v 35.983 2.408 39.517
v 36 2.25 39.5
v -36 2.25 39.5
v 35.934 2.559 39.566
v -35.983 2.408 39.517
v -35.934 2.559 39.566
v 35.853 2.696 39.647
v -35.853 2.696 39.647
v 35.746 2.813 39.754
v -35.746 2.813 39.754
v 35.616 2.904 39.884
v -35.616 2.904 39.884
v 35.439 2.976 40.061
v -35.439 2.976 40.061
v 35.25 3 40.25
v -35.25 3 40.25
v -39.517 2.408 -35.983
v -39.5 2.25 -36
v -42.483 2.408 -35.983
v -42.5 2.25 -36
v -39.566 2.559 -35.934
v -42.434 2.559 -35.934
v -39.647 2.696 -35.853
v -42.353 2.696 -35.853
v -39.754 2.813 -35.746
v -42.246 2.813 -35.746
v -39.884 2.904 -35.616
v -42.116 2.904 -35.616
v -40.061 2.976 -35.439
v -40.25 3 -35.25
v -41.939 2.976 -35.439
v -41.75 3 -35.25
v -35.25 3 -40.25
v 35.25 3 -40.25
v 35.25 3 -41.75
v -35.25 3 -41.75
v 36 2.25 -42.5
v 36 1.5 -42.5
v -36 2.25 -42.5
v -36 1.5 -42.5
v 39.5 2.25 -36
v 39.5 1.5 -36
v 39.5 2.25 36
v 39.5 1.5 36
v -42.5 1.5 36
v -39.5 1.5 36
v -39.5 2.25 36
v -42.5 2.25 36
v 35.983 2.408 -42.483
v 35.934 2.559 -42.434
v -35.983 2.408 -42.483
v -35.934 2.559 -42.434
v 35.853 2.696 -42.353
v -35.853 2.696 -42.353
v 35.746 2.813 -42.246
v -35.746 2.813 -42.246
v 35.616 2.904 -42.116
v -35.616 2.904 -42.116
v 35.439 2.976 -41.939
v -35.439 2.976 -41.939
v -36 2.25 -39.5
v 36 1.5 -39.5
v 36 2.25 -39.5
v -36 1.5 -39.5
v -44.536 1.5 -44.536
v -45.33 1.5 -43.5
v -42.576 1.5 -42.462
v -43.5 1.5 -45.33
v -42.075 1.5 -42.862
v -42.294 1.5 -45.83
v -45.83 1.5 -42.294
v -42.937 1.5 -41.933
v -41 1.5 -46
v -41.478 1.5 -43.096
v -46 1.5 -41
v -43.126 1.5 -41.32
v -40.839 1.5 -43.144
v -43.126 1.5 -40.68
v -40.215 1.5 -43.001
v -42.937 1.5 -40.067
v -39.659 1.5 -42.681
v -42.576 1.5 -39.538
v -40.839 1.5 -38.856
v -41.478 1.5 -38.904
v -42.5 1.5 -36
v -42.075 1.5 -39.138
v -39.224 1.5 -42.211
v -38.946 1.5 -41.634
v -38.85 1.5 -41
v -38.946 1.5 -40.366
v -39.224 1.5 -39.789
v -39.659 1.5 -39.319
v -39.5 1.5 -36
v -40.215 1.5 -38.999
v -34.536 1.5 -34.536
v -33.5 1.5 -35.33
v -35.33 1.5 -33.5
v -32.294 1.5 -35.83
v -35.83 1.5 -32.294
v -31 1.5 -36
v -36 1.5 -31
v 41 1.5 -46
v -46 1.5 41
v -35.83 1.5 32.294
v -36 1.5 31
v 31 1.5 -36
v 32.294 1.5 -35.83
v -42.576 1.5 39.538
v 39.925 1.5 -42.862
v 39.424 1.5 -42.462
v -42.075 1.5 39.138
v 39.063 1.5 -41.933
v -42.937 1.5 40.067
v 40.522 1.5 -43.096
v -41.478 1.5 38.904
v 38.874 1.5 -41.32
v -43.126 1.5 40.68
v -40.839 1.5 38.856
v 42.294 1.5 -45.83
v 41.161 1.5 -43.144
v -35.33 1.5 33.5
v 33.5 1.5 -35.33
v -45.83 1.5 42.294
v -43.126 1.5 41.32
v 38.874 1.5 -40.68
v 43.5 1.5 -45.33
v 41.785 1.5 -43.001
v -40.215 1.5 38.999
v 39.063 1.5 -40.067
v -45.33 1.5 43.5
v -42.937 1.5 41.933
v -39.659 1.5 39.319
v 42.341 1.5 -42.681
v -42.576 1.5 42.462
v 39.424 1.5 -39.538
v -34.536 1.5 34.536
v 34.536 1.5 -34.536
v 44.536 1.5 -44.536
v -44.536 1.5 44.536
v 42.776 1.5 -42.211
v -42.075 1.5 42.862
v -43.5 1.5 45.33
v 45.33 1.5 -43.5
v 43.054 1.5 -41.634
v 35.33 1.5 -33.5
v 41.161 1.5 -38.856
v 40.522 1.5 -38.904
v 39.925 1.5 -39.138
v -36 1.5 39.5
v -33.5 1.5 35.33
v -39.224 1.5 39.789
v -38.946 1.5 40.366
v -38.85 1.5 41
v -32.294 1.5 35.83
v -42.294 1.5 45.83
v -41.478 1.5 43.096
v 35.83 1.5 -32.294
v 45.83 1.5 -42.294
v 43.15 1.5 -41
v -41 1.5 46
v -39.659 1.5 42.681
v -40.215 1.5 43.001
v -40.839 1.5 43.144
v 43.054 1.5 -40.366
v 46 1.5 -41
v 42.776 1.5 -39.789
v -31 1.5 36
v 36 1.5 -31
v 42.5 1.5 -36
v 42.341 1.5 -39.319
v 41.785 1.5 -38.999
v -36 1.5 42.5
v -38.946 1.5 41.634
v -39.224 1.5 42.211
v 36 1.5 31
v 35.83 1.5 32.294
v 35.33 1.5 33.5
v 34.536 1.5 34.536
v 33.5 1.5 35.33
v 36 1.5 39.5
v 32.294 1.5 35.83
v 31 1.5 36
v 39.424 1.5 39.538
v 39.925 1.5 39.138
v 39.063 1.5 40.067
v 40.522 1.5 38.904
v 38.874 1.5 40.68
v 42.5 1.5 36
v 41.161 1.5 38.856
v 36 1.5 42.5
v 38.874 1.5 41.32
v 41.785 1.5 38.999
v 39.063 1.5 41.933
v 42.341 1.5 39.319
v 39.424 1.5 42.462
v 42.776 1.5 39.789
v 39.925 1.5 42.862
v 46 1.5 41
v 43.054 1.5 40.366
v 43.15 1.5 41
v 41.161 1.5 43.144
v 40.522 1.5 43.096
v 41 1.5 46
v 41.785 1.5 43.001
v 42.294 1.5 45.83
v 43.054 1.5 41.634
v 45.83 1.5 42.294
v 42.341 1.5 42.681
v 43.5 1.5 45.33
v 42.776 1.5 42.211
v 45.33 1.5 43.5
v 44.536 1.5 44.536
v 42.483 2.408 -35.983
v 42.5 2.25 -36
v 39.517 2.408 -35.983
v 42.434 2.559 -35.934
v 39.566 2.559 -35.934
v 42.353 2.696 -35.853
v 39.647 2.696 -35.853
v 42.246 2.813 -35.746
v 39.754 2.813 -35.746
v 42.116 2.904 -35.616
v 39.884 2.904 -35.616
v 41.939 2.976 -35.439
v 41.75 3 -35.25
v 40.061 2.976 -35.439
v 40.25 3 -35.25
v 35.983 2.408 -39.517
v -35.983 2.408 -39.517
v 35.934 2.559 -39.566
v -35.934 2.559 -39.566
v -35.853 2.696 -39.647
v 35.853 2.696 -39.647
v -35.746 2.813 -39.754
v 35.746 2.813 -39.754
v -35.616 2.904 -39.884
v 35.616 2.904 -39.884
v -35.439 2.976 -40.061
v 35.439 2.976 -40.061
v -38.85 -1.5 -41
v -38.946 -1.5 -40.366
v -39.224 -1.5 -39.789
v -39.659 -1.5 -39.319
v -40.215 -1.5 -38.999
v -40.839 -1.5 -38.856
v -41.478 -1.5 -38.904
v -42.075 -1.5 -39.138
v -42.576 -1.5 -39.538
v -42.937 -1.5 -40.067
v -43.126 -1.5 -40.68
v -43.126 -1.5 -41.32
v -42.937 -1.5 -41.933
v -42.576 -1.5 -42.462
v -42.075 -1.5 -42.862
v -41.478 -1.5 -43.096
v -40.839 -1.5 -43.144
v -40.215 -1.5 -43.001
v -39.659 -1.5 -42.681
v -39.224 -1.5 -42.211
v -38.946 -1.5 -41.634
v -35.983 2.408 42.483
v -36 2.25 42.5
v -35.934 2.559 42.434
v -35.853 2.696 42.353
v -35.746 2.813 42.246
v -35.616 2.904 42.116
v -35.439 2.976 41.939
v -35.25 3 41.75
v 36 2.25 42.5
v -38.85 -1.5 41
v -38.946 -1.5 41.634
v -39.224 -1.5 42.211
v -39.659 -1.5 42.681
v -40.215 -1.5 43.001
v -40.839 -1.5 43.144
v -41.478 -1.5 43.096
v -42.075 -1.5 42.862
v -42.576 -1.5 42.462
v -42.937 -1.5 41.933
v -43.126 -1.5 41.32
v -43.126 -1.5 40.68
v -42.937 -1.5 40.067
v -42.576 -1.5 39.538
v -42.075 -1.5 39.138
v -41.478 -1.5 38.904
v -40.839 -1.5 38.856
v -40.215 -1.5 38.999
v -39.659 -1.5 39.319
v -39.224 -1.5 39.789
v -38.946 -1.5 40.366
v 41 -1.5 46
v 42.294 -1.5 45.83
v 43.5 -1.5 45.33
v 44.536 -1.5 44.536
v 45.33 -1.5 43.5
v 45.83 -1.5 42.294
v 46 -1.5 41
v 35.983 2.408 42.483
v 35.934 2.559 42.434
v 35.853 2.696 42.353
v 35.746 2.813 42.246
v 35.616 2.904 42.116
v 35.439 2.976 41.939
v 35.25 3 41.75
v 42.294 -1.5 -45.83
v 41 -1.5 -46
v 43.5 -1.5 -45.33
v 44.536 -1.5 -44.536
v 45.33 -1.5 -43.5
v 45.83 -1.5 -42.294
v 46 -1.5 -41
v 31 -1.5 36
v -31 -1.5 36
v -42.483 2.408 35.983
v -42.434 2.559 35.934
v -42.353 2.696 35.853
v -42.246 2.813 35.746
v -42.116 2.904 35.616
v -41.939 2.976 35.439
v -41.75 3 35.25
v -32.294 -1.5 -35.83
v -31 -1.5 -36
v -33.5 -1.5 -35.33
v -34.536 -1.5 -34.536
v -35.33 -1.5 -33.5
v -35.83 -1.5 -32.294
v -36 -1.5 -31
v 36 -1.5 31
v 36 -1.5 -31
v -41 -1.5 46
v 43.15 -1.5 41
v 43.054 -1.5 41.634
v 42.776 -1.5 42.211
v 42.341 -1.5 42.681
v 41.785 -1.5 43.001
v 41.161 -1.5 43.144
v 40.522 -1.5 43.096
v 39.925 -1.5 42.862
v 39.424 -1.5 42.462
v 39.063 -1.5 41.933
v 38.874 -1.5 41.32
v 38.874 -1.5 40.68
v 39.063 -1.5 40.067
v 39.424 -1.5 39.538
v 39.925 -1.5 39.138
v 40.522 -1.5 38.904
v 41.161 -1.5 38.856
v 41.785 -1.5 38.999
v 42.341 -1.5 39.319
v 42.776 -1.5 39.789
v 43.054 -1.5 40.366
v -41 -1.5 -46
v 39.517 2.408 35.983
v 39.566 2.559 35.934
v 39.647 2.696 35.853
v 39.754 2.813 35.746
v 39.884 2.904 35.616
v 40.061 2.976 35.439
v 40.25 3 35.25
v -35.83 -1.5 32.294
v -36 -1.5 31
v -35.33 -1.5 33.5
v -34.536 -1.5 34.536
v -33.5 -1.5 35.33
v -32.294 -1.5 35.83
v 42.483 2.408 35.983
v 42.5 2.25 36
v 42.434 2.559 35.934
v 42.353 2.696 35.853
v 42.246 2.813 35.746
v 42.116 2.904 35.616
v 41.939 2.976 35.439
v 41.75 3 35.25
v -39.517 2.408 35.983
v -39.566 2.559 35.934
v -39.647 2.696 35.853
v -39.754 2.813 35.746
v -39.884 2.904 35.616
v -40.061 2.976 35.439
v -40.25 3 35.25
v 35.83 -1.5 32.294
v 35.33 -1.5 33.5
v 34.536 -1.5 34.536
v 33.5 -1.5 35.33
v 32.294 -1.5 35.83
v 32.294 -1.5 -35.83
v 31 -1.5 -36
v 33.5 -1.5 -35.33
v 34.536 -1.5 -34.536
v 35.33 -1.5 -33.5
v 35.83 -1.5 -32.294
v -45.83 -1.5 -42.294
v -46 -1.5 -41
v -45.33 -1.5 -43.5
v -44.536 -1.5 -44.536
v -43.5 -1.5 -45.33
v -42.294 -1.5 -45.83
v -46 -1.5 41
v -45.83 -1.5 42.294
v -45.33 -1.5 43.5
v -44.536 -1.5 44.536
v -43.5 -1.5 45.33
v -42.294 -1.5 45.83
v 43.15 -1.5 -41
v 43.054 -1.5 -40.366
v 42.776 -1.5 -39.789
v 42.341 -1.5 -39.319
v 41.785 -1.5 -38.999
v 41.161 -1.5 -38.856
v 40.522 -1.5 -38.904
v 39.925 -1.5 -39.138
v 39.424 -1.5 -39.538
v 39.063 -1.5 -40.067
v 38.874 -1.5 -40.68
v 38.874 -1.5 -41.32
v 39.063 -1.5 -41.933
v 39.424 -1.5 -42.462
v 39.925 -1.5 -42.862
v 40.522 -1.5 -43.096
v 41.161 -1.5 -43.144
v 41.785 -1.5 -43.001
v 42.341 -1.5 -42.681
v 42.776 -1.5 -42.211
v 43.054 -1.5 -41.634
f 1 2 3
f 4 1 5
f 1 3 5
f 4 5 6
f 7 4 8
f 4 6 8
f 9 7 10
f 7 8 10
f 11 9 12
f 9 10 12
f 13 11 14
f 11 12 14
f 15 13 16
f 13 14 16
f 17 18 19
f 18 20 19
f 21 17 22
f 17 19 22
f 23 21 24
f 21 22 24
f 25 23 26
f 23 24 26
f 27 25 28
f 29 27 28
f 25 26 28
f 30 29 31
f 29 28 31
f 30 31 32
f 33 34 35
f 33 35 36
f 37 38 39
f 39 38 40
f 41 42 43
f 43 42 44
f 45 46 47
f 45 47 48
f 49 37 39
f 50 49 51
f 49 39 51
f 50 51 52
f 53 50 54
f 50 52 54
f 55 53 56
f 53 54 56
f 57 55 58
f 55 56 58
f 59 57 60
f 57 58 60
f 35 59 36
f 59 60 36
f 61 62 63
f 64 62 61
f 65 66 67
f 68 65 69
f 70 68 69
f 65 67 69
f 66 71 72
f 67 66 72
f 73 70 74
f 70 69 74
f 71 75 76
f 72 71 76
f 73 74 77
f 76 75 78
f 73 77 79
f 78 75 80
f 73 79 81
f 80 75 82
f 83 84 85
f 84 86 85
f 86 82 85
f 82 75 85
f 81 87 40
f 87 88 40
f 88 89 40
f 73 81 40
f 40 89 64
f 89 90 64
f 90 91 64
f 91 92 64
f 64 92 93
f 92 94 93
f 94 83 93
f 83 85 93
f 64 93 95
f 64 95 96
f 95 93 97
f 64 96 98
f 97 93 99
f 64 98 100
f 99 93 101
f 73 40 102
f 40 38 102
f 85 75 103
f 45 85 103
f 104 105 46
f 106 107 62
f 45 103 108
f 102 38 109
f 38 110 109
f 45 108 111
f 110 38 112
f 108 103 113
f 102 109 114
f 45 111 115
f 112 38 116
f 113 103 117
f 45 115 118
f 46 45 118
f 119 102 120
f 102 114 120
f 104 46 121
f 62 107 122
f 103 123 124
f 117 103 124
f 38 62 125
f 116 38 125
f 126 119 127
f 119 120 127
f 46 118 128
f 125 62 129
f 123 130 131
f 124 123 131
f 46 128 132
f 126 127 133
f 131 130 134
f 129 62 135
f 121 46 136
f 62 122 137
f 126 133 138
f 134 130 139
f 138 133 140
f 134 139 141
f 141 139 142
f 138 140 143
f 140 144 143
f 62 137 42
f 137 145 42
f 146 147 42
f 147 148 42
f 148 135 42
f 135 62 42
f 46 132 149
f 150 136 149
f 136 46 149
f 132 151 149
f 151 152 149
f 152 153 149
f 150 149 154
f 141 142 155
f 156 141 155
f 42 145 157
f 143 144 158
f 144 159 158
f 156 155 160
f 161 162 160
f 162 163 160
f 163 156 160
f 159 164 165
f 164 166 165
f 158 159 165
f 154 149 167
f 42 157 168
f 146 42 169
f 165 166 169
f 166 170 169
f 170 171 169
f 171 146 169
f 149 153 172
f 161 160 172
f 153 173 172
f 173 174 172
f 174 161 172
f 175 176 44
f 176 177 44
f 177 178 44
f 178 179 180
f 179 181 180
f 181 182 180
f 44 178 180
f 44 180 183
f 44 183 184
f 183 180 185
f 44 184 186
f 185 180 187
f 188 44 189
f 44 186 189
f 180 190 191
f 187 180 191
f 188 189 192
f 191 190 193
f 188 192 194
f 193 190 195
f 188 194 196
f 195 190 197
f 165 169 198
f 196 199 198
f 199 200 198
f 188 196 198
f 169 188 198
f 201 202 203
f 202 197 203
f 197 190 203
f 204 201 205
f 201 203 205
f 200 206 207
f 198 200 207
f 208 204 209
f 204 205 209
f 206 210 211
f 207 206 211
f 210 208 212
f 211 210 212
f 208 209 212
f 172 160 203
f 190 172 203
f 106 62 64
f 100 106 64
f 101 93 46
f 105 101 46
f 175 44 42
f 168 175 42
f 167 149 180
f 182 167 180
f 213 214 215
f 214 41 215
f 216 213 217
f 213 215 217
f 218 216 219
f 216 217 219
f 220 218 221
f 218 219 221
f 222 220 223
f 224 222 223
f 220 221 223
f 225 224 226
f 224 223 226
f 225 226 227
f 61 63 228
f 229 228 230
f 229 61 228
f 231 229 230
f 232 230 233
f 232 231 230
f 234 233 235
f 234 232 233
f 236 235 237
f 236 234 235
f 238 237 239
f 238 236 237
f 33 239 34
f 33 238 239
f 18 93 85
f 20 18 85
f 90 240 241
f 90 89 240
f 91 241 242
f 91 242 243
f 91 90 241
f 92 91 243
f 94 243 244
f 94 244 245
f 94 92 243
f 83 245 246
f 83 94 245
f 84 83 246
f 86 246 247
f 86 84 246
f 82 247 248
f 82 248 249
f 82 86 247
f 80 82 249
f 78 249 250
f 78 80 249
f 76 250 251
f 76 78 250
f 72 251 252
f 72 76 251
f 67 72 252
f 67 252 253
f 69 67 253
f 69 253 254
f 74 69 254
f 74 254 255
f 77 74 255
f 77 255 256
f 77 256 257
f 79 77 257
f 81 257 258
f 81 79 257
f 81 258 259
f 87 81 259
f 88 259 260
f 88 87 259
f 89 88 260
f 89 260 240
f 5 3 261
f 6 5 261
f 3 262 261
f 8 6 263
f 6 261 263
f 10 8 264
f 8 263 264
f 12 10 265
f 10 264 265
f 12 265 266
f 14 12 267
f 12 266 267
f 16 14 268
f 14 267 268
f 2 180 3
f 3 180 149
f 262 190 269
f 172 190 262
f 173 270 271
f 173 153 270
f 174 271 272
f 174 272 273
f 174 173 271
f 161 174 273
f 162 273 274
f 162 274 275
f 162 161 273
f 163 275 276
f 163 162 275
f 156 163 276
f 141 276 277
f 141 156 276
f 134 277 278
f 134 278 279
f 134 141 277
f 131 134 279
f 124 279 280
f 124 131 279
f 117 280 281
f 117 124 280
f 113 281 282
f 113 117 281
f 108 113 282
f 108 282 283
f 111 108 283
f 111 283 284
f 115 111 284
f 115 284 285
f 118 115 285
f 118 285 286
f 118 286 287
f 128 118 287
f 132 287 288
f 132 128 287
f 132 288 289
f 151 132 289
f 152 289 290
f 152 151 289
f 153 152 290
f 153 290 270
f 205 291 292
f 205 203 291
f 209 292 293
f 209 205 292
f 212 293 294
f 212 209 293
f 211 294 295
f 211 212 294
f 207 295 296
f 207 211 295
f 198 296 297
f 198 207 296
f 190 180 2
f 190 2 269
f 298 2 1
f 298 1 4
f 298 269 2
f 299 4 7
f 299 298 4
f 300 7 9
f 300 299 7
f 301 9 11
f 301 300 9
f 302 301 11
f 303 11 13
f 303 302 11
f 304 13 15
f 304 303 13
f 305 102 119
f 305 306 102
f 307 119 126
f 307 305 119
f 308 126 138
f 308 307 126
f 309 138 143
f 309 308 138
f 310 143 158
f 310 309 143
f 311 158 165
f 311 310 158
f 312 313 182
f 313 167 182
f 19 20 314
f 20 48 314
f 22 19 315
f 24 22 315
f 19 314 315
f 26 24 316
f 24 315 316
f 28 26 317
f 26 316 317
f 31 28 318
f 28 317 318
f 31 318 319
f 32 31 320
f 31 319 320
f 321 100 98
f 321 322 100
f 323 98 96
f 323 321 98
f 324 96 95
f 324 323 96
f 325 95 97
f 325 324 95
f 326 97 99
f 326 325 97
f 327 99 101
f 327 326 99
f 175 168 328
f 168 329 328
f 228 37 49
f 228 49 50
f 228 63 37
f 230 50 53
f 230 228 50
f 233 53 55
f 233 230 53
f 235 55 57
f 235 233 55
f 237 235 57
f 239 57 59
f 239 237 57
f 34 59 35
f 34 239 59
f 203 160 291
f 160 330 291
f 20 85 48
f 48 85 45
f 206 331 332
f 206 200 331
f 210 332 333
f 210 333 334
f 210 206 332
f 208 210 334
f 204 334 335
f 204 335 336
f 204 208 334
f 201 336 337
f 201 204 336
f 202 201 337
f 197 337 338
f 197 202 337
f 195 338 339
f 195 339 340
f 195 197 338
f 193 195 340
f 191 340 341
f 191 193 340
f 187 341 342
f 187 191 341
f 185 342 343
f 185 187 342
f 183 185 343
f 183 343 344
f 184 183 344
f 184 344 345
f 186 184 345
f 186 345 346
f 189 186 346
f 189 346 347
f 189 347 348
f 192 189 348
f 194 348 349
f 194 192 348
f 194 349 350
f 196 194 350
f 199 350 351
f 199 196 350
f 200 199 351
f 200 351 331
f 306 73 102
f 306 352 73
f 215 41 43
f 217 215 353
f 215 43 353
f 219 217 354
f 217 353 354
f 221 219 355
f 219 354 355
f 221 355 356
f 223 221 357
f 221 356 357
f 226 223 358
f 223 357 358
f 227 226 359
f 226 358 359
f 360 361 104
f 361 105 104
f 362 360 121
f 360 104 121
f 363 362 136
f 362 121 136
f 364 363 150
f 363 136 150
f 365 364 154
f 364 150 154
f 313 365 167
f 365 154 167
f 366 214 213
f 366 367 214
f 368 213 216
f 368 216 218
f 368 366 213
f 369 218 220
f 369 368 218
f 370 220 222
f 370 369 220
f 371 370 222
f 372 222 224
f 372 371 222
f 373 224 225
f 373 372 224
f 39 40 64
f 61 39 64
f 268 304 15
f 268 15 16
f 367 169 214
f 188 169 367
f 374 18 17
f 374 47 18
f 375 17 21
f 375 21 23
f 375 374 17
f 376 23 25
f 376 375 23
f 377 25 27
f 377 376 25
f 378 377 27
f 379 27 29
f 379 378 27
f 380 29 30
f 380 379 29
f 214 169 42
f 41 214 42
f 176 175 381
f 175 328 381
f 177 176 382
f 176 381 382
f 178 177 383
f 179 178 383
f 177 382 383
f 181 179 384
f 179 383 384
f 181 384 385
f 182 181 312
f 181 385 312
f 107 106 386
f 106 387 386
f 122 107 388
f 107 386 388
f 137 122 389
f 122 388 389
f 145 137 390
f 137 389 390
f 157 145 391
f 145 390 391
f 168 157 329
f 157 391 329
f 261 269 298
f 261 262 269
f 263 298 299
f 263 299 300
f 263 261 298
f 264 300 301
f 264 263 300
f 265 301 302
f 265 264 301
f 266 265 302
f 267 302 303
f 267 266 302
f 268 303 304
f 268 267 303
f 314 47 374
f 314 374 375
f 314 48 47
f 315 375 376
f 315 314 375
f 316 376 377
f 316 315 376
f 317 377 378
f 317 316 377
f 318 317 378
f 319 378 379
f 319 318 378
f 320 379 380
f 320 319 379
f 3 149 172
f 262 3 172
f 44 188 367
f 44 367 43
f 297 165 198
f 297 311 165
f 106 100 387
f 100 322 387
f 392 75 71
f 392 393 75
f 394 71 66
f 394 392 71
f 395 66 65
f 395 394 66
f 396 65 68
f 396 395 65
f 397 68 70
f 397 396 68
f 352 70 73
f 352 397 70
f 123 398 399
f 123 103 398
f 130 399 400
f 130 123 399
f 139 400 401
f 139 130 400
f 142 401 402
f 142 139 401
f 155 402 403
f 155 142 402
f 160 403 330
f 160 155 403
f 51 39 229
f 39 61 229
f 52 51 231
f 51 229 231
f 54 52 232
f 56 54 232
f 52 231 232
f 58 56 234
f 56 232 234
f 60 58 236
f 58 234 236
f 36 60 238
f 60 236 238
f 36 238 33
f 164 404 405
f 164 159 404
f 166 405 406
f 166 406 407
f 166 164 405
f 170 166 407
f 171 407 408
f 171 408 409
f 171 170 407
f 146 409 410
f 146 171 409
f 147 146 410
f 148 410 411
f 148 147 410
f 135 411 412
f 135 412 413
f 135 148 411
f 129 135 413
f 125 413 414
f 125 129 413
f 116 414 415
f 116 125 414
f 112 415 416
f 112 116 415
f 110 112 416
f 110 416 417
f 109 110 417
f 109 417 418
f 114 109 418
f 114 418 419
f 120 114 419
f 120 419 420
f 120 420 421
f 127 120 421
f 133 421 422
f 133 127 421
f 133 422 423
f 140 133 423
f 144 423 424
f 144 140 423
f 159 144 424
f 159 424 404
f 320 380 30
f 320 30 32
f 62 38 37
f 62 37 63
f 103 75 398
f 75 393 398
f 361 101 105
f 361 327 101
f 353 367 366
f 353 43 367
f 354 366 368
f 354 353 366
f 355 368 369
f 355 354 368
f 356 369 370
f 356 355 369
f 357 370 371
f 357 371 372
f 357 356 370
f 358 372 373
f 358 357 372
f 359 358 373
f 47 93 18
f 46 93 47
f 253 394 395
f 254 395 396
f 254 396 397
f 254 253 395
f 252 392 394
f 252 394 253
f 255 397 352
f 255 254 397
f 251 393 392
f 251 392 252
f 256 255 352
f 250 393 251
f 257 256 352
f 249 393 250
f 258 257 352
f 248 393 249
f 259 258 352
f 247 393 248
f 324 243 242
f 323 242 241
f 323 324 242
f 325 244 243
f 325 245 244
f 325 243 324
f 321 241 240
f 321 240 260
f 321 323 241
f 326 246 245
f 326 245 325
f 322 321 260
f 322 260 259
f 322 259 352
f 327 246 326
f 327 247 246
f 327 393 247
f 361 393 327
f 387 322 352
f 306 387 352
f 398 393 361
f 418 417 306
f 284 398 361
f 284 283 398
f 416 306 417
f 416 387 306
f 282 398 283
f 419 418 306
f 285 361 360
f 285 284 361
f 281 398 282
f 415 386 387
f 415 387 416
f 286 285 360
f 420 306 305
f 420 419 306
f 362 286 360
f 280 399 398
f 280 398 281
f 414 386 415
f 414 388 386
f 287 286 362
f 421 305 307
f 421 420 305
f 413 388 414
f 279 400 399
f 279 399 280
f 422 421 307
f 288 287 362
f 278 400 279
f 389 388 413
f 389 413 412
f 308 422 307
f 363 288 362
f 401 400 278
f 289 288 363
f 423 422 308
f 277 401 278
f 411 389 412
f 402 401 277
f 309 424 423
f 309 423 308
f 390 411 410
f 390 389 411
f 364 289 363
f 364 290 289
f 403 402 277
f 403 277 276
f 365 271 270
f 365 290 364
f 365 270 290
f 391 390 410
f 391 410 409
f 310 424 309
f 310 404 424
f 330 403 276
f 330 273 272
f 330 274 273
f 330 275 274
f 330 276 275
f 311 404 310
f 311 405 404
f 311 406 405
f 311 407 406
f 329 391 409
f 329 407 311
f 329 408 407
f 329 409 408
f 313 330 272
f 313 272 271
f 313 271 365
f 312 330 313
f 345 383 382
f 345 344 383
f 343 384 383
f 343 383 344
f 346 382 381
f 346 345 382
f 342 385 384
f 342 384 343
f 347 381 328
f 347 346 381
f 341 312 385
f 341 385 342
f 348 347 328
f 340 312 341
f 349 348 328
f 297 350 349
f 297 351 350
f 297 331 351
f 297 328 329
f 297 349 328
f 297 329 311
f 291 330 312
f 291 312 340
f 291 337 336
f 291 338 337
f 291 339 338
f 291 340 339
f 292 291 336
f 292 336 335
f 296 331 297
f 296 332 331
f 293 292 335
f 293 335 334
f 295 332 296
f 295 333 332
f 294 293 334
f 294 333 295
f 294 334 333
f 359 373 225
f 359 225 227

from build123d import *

# Parameters (mm, degrees)
F0_W     = 92
F0_H     = 92
F0_R     = 2.15
F0_W_2   = 72
F0_H_2   = 72
F1_DEPTH = 1.5
F2_W     = 72
F2_H     = 3
F2_W_2   = 3
F2_H_2   = 72
F3_DEPTH = 1.5
F4_R     = 5
F5_R     = 0.75


with BuildPart() as f1:
    # F0 (on Front) → F1 (new body, symmetric)
    with BuildSketch(Plane.XZ):
        Rectangle(F0_W, F0_H)
        with Locations((-41, -41)):
            Circle(F0_R, mode=Mode.SUBTRACT)
        with Locations((41, -41)):
            Circle(F0_R, mode=Mode.SUBTRACT)
        with Locations((-41, 41)):
            Circle(F0_R, mode=Mode.SUBTRACT)
        Rectangle(F0_W_2, F0_H_2, mode=Mode.SUBTRACT)
        with Locations((41, 41)):
            Circle(F0_R, mode=Mode.SUBTRACT)
    extrude(amount=F1_DEPTH, both=True)

    # F2 (on face) → F3 (join)
    with BuildSketch(Plane(origin=(0, 1.5, 0), x_dir=(-1, 0, 0), z_dir=(0, 1, 0))):
        with Locations((0, 41)):
            Rectangle(F2_W, F2_H)
        with Locations((-41, 0)):
            Rectangle(F2_W_2, F2_H_2)
        with Locations((41, 0)):
            Rectangle(F2_W_2, F2_H_2)
        with Locations((0, -41)):
            Rectangle(F2_W, F2_H)
    extrude(amount=F3_DEPTH)

    # F4
    f4_edges = [f1.edges().sort_by_distance(p)[0] for p in [
        (-46, 0, 46),
        (46, 0, 46),
        (46, 0, -46),
        (-46, 0, -46),
        (36, 0, -36),
        (-36, 0, -36),
        (36, 0, 36),
        (-36, 0, 36),
    ]]
    fillet(f4_edges, radius=F4_R)

    # F5
    f5_edges = [f1.edges().sort_by_distance(p)[0] for p in [
        (39.5, 3, 0),
        (42.5, 3, 0),
        (41, 3, -36),
        (41, 3, 36),
        (0, 3, 42.5),
        (36, 3, 41),
        (0, 3, 39.5),
        (-36, 3, 41),
        (-41, 3, 36),
        (-39.5, 3, 0),
        (-42.5, 3, 0),
        (-41, 3, -36),
        (-36, 3, -41),
        (0, 3, -39.5),
        (36, 3, -41),
        (0, 3, -42.5),
    ]]
    fillet(f5_edges, radius=F5_R)


solid = f1.part
